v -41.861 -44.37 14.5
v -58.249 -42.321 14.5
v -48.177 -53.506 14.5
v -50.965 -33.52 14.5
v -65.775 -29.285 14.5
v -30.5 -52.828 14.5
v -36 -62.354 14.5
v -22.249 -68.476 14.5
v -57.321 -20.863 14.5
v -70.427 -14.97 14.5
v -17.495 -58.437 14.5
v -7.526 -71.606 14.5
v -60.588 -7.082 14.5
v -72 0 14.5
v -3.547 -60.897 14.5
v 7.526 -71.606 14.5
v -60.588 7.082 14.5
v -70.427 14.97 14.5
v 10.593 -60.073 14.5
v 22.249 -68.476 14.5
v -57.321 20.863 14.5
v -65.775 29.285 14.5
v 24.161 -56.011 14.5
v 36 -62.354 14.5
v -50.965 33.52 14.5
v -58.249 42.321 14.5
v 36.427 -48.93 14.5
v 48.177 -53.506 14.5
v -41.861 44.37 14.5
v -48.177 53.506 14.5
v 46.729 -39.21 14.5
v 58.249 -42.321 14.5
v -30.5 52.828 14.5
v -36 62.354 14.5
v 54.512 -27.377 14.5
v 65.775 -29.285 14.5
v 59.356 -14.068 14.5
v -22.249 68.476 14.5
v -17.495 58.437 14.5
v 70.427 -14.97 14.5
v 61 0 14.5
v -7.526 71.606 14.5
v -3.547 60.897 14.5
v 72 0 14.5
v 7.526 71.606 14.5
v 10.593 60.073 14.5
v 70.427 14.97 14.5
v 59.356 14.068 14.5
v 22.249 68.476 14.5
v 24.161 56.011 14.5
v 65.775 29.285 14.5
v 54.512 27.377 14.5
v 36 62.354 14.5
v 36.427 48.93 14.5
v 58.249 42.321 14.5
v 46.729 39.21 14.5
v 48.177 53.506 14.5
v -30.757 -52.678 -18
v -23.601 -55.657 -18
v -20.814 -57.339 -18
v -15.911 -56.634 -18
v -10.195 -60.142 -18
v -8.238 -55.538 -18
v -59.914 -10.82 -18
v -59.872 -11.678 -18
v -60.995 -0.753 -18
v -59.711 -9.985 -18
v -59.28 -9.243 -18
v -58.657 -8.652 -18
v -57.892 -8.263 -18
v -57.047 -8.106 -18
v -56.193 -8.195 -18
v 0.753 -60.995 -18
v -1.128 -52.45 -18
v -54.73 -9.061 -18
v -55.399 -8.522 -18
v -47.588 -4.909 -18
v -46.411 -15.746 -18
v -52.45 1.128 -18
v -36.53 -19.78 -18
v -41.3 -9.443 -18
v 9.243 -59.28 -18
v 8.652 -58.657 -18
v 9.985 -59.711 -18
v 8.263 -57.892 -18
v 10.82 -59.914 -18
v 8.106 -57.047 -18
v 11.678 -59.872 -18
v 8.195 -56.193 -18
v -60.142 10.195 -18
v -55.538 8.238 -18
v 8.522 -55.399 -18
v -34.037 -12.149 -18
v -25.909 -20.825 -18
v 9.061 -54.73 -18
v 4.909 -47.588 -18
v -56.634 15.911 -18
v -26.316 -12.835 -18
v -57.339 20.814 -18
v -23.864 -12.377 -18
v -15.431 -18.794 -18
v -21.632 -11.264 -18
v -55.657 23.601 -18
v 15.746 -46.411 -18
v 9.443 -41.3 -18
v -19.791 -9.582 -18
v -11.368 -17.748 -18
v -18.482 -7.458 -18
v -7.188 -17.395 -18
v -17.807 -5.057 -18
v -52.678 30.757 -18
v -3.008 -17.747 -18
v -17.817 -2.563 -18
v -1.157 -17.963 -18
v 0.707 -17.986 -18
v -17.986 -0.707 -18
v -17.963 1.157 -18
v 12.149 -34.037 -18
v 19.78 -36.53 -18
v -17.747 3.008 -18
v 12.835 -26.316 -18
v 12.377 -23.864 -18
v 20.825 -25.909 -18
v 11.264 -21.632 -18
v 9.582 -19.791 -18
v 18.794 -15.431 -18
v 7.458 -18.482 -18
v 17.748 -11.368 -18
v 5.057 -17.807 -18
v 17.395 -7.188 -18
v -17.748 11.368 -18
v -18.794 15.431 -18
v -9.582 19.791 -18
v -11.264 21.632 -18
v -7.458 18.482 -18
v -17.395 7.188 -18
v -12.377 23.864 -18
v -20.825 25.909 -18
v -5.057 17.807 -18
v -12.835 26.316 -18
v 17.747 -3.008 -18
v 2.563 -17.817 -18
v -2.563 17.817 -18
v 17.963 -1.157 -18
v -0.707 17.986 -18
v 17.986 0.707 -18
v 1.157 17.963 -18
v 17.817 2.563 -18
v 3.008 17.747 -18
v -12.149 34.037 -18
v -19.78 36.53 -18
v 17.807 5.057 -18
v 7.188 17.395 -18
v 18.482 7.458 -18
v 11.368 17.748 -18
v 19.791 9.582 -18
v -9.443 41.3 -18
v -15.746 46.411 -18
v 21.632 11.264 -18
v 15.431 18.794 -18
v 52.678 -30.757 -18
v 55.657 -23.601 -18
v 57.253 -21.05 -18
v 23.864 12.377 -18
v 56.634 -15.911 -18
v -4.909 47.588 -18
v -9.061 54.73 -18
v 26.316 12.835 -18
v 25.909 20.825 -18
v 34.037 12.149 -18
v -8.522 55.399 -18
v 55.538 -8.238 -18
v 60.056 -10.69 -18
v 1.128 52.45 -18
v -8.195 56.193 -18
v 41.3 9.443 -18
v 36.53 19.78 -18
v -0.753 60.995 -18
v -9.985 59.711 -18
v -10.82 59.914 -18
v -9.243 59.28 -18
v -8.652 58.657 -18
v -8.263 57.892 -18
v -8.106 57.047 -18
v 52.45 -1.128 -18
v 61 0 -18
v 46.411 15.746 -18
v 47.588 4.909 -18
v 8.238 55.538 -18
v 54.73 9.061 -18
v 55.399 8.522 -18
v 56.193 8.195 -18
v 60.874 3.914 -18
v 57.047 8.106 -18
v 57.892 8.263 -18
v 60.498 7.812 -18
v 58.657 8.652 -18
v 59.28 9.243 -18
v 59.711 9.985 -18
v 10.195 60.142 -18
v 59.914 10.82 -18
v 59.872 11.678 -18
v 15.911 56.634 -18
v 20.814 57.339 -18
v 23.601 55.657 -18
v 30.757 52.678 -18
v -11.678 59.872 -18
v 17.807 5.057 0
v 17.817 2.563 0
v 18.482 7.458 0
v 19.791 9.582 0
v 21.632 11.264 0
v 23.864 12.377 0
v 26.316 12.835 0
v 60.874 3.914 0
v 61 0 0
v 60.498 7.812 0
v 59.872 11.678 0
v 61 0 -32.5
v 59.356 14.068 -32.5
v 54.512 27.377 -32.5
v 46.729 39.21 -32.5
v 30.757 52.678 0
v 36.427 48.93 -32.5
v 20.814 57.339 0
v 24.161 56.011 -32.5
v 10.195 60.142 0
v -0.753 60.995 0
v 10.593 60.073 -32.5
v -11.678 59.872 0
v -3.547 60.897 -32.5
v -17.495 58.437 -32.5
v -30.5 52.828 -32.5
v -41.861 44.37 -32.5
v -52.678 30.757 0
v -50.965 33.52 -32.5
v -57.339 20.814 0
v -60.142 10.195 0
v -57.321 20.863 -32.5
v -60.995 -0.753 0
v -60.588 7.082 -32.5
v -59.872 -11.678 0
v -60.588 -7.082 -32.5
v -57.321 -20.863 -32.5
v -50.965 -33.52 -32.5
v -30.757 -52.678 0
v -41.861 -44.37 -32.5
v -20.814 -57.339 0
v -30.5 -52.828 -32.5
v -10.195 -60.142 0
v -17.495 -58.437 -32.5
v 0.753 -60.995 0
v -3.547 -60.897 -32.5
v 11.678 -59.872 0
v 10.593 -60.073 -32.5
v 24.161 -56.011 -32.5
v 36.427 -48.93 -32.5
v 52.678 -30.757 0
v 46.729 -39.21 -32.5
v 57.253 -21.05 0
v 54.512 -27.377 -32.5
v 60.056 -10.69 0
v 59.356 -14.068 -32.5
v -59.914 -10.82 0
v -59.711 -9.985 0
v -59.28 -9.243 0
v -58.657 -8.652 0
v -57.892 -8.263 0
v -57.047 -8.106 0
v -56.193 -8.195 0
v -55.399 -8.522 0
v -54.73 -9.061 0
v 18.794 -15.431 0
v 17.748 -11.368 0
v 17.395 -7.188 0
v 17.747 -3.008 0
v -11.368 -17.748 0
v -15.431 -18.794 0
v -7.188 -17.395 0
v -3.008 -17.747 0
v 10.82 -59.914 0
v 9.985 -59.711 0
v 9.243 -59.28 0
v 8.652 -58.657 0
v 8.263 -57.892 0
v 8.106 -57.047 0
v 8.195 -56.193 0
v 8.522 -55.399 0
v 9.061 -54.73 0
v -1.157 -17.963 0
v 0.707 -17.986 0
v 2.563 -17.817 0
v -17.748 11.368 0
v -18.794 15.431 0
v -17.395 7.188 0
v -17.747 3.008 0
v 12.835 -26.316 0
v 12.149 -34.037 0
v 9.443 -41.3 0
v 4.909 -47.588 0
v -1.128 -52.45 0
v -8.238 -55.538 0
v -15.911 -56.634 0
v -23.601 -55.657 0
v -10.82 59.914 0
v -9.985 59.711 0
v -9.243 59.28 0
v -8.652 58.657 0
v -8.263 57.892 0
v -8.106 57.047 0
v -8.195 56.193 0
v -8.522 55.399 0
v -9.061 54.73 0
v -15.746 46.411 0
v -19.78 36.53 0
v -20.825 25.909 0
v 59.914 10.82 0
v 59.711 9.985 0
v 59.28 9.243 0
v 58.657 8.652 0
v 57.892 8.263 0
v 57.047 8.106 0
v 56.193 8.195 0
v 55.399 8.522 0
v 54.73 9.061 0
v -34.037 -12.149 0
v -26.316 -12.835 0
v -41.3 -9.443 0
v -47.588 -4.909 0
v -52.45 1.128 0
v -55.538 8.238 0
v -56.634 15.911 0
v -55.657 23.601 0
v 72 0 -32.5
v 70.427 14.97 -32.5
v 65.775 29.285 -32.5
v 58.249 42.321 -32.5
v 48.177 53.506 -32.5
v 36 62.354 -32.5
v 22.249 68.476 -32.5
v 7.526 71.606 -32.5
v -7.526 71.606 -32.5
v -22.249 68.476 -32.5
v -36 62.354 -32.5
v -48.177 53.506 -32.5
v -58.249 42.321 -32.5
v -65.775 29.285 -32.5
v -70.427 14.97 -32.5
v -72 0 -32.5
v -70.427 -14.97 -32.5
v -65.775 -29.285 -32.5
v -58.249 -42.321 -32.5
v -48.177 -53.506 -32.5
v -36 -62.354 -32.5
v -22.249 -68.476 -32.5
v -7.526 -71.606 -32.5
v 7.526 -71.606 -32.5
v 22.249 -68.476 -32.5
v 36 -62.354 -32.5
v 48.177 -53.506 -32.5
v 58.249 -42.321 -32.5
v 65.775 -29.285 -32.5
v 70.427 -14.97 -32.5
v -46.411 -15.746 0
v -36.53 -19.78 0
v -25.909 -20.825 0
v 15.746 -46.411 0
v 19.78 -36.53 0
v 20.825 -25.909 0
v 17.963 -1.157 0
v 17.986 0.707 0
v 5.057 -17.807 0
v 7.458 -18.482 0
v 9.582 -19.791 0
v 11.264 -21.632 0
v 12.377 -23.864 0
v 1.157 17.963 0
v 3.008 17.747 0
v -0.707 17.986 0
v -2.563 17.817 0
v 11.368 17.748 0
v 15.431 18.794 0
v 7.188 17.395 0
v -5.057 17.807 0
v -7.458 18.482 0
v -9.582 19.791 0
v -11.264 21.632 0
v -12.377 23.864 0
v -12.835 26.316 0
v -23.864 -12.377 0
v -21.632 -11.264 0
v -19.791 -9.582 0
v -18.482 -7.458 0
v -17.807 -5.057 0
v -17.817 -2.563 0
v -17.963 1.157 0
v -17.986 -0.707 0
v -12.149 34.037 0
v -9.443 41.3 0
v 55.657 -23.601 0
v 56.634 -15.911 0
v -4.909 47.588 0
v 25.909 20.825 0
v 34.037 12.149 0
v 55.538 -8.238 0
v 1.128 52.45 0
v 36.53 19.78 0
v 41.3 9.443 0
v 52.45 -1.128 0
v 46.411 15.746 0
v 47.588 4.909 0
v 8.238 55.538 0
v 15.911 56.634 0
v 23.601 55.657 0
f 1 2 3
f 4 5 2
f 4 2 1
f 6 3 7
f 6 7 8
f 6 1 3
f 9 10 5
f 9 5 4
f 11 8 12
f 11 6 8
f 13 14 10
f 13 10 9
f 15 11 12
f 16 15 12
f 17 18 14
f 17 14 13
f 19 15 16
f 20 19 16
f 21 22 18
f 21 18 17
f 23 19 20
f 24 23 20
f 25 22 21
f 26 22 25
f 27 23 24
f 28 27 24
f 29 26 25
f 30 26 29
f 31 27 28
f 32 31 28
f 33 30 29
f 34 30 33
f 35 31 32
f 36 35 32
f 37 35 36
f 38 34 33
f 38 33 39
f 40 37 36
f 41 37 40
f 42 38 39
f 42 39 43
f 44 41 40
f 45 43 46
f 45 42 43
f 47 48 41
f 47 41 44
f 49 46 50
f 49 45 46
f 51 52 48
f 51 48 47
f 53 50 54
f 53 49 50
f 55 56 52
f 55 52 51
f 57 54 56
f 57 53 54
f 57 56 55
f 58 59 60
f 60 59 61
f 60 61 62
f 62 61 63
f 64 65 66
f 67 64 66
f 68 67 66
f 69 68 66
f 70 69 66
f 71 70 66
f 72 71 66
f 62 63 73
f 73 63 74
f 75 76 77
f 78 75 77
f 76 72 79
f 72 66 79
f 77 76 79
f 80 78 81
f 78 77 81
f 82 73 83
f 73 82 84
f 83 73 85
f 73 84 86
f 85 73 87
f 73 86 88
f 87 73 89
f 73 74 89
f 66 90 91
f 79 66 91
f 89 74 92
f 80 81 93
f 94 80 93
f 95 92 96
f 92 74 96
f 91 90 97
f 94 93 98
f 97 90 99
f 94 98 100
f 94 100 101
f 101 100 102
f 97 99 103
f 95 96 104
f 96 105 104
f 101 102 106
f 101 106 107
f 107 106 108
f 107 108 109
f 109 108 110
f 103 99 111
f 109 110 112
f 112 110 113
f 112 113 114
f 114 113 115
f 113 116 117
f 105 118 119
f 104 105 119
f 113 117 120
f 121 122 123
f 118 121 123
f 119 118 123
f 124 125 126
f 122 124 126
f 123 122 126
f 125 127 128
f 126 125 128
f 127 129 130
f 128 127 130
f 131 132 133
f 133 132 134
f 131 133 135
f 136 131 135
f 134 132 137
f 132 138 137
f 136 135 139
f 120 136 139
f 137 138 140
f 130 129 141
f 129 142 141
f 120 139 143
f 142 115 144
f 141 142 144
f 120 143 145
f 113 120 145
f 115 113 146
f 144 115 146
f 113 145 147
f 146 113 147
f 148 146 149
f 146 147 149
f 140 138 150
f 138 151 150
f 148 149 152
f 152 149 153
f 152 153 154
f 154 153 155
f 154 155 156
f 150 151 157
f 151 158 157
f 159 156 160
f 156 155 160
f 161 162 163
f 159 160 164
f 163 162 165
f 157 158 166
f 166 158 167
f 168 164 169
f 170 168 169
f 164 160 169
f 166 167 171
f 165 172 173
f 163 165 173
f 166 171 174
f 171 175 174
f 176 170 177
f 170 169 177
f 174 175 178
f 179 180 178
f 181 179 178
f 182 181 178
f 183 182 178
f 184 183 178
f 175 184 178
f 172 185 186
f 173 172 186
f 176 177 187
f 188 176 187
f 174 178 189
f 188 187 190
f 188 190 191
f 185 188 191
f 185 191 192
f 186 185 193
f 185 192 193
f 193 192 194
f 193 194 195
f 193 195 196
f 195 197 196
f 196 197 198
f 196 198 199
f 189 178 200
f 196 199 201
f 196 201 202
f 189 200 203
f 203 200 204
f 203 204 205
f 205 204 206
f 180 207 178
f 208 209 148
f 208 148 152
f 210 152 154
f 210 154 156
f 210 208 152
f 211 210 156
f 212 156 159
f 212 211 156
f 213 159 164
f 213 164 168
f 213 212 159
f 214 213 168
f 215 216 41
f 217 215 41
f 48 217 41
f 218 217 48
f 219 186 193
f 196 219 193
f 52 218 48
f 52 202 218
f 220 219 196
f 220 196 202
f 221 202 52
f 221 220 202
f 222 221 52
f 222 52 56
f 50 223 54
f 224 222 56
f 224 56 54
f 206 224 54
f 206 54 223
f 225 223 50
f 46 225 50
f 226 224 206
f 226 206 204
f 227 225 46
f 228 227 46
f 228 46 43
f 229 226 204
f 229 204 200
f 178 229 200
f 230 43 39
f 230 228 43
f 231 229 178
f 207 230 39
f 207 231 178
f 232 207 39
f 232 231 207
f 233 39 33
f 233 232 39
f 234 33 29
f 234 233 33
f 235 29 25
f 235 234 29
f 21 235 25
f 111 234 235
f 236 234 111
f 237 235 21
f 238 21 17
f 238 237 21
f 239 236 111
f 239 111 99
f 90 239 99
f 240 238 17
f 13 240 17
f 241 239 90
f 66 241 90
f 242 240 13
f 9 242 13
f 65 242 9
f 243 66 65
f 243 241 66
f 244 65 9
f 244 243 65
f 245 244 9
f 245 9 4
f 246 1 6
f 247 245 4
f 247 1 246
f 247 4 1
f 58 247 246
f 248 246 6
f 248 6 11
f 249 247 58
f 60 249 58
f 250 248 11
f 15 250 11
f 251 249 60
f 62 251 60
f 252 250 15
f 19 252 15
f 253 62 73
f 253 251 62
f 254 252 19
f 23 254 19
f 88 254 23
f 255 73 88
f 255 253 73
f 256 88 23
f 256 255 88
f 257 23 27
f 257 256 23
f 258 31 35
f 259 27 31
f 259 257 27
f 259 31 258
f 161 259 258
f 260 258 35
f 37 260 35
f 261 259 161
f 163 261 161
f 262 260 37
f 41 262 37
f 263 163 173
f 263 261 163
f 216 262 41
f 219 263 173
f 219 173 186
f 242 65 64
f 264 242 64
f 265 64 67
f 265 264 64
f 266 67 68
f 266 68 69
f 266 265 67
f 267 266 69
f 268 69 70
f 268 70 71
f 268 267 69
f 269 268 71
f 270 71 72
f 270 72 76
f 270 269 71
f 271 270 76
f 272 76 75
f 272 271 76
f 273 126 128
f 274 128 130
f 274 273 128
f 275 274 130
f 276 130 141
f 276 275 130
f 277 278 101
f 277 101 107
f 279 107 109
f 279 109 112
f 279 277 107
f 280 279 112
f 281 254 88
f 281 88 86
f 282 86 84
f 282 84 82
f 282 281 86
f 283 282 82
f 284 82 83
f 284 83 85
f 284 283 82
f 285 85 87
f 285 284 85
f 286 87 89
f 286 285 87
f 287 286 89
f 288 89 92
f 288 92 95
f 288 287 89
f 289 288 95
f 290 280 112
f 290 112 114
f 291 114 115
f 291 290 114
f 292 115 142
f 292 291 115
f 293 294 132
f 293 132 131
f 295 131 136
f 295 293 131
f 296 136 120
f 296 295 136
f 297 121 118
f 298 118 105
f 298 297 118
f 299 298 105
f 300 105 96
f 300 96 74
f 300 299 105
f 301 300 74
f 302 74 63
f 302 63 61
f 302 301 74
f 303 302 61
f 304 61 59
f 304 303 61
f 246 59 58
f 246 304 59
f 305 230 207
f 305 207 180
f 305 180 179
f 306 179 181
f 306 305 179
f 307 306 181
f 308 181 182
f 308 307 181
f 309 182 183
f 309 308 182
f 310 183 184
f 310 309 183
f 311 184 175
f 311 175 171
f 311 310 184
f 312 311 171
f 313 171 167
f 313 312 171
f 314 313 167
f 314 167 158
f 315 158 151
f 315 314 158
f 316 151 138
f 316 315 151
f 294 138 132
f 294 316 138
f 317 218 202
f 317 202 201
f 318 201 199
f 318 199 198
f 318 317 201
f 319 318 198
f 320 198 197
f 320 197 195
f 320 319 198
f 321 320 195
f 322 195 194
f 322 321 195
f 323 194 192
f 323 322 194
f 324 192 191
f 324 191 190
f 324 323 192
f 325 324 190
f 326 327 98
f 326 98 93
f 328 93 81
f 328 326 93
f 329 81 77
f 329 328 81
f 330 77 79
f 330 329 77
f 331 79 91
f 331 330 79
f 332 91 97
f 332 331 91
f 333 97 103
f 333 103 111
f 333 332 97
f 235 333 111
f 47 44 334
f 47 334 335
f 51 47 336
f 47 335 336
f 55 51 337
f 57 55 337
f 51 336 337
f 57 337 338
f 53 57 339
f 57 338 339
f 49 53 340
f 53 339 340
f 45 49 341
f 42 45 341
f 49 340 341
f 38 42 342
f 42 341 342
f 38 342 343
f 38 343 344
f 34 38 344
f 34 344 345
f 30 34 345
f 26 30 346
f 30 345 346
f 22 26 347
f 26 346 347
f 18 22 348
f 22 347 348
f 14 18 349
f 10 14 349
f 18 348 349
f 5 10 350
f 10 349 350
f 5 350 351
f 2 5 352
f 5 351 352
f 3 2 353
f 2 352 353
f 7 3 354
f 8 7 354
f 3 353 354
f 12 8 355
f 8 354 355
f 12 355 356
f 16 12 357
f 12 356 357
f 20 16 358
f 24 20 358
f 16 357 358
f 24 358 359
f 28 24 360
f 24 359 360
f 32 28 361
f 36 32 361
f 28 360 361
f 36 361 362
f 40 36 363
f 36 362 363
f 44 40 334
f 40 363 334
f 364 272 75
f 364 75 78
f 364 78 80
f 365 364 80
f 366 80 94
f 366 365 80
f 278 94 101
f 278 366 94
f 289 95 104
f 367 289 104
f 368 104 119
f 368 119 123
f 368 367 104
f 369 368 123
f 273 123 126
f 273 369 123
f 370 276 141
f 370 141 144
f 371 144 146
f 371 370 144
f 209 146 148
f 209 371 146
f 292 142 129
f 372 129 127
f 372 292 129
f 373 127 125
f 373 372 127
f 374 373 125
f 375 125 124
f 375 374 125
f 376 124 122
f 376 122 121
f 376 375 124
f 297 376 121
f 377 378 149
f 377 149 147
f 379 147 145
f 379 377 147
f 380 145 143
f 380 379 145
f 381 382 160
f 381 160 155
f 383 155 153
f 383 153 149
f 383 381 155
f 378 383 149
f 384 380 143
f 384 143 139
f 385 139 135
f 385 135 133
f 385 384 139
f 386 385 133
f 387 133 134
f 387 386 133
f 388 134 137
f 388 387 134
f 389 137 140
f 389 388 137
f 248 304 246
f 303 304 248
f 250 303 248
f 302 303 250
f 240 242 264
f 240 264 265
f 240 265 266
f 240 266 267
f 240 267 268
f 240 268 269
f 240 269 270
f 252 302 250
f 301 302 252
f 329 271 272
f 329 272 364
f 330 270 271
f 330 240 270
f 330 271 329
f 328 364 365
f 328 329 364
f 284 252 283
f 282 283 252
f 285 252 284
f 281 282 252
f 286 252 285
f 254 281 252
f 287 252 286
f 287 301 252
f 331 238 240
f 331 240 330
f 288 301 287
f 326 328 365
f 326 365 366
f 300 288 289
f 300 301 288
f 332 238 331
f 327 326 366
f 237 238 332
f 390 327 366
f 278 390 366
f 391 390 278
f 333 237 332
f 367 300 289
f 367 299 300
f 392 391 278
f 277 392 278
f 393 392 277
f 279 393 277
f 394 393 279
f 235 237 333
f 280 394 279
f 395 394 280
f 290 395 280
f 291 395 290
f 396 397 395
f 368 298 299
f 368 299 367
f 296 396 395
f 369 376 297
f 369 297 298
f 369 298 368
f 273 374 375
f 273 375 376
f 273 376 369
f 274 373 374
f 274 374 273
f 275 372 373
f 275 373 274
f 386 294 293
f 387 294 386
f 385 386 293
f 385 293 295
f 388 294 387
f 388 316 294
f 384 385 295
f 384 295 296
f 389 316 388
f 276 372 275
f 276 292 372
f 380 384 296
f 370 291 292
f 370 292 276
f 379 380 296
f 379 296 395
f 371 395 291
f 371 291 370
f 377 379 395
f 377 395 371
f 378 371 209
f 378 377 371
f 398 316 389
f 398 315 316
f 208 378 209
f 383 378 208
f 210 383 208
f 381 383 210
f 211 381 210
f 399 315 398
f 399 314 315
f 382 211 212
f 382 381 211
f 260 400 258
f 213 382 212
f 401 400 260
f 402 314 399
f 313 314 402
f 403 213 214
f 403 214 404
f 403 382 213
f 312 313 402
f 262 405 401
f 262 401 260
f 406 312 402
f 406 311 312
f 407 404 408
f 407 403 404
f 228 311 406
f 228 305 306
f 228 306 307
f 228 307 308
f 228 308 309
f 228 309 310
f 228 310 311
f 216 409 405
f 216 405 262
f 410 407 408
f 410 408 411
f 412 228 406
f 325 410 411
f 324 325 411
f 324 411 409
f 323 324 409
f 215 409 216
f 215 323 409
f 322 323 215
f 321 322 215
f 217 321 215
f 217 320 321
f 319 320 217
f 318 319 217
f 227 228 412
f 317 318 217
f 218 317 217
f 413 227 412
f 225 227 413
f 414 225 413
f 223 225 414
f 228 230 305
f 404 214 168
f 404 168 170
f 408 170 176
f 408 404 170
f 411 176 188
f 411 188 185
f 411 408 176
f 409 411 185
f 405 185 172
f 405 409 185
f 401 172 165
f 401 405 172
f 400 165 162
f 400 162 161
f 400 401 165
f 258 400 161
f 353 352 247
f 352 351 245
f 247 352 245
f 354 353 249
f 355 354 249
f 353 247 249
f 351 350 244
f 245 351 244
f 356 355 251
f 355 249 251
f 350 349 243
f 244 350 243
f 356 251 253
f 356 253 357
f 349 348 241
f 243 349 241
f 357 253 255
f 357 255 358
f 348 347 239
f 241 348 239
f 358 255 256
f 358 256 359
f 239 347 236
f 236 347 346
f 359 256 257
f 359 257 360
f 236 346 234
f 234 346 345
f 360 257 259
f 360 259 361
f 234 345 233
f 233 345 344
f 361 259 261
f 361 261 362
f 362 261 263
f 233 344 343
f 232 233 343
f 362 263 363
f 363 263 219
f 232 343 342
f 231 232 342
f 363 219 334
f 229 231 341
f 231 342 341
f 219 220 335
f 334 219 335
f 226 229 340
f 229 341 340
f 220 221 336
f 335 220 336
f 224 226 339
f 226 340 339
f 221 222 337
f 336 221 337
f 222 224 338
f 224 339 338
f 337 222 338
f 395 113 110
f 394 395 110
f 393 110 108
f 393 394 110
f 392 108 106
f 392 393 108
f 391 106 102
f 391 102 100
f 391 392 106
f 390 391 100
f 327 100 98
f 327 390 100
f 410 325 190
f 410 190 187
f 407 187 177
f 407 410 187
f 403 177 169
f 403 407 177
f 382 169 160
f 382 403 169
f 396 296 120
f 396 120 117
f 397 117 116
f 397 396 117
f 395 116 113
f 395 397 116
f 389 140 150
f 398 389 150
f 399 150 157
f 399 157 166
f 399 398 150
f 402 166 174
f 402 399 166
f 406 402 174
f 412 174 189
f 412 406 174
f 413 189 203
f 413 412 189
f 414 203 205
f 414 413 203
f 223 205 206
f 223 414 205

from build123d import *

# Parameters (mm, degrees)
BOSS_EXTRUDE5_DEPTH      = 18
BOSS_EXTRUDE6_DEPTH      = 14.5
BOSS_EXTRUDE6_DEPTH_BACK = 32.5
SKETCH5_R                = 72
SKETCH5_R_2              = 61


with BuildPart() as part:
    # Sketch1 → Boss-Extrude5 (new body)
    with BuildSketch(Plane.XY):
        with BuildLine():
            ThreePointArc((-30.757316719, -52.678149818), (-10.195342734, -60.141956956), (11.677704627, -59.871789807))
            ThreePointArc((11.677704627, -59.871789807), (8.429841492, -58.288205935), (9.060512734, -54.730312371))
            ThreePointArc((9.060512734, -54.730312371), (19.779749173, -36.530020554), (18.79448635, -15.430686222))
            ThreePointArc((18.79448635, -15.430686222), (17.483891441, -9.285507816), (17.746946993, -3.007635689))
            ThreePointArc((17.746946993, -3.007635689), (17.99859257, -0.225089943), (17.816611705, 2.562878725))
            ThreePointArc((17.816611705, 2.562878725), (19.790690206, 9.581605585), (26.315634879, 12.835005296))
            ThreePointArc((26.315634879, 12.835005296), (52.449565984, -1.128017494), (52.67814252, -30.757329218))
            ThreePointArc((52.67814252, -30.757329218), (60.141955689, -10.195350207), (59.871789938, 11.677703954))
            ThreePointArc((59.871789938, 11.677703954), (58.288206152, 8.429840898), (54.730312659, 9.060511918))
            ThreePointArc((54.730312659, 9.060511918), (36.530019461, 19.779748115), (15.430684033, 18.794485892))
            ThreePointArc((15.430684033, 18.794485892), (9.285506382, 17.48389147), (3.007635099, 17.746947093))
            ThreePointArc((3.007635099, 17.746947093), (0.225087357, 17.998592603), (-2.562883253, 17.816611054))
            ThreePointArc((-2.562883253, 17.816611054), (-9.581612202, 19.790686823), (-12.835014333, 26.315631712))
            ThreePointArc((-12.835014333, 26.315631712), (1.128002953, 52.449566526), (30.757315296, 52.678150649))
            ThreePointArc((30.757315296, 52.678150649), (10.195341286, 60.141957202), (-11.677705893, 59.87178956))
            ThreePointArc((-11.677705893, 59.87178956), (-8.429842727, 58.288205762), (-9.060513882, 54.730312188))
            ThreePointArc((-9.060513882, 54.730312188), (-19.779749829, 36.530020233), (-18.794486597, 15.430686052))
            ThreePointArc((-18.794486597, 15.430686052), (-17.48389156, 9.285507447), (-17.746947093, 3.007635099))
            ThreePointArc((-17.746947093, 3.007635099), (-17.998592591, 0.225088317), (-17.816611327, -2.56288135))
            ThreePointArc((-17.816611327, -2.56288135), (-19.790686113, -9.581611967), (-26.315632103, -12.835014885))
            ThreePointArc((-26.315632103, -12.835014885), (-52.44956681, 1.128003994), (-52.678149652, 30.757317003))
            ThreePointArc((-52.678149652, 30.757317003), (-60.141956871, 10.195343235), (-59.871789938, -11.677703952))
            ThreePointArc((-59.871789938, -11.677703952), (-58.288206008, -8.429840823), (-54.73031244, -9.060512152))
            ThreePointArc((-54.73031244, -9.060512152), (-36.530020387, -19.779749225), (-15.430685526, -18.794486492))
            ThreePointArc((-15.430685526, -18.794486492), (-9.285507097, -17.483891569), (-3.007634946, -17.746947119))
            ThreePointArc((-3.007634946, -17.746947119), (-0.225087887, -17.998592596), (2.562882049, -17.816611227))
            ThreePointArc((2.562882049, -17.816611227), (9.581611647, -19.79068664), (12.835014058, -26.315631978))
            ThreePointArc((12.835014058, -26.315631978), (-1.128004083, -52.449566659), (-30.757316719, -52.678149818))
        make_face()
    extrude(amount=-BOSS_EXTRUDE5_DEPTH)

    # Sketch5 → Boss-Extrude6 (add, two sides: drawn at the far end of the back side and taken through both)
    with BuildSketch(Plane.XY.offset(-BOSS_EXTRUDE6_DEPTH_BACK)):
        Circle(SKETCH5_R)
        Circle(SKETCH5_R_2, mode=Mode.SUBTRACT)
    extrude(amount=BOSS_EXTRUDE6_DEPTH + BOSS_EXTRUDE6_DEPTH_BACK)


solid = part.part
